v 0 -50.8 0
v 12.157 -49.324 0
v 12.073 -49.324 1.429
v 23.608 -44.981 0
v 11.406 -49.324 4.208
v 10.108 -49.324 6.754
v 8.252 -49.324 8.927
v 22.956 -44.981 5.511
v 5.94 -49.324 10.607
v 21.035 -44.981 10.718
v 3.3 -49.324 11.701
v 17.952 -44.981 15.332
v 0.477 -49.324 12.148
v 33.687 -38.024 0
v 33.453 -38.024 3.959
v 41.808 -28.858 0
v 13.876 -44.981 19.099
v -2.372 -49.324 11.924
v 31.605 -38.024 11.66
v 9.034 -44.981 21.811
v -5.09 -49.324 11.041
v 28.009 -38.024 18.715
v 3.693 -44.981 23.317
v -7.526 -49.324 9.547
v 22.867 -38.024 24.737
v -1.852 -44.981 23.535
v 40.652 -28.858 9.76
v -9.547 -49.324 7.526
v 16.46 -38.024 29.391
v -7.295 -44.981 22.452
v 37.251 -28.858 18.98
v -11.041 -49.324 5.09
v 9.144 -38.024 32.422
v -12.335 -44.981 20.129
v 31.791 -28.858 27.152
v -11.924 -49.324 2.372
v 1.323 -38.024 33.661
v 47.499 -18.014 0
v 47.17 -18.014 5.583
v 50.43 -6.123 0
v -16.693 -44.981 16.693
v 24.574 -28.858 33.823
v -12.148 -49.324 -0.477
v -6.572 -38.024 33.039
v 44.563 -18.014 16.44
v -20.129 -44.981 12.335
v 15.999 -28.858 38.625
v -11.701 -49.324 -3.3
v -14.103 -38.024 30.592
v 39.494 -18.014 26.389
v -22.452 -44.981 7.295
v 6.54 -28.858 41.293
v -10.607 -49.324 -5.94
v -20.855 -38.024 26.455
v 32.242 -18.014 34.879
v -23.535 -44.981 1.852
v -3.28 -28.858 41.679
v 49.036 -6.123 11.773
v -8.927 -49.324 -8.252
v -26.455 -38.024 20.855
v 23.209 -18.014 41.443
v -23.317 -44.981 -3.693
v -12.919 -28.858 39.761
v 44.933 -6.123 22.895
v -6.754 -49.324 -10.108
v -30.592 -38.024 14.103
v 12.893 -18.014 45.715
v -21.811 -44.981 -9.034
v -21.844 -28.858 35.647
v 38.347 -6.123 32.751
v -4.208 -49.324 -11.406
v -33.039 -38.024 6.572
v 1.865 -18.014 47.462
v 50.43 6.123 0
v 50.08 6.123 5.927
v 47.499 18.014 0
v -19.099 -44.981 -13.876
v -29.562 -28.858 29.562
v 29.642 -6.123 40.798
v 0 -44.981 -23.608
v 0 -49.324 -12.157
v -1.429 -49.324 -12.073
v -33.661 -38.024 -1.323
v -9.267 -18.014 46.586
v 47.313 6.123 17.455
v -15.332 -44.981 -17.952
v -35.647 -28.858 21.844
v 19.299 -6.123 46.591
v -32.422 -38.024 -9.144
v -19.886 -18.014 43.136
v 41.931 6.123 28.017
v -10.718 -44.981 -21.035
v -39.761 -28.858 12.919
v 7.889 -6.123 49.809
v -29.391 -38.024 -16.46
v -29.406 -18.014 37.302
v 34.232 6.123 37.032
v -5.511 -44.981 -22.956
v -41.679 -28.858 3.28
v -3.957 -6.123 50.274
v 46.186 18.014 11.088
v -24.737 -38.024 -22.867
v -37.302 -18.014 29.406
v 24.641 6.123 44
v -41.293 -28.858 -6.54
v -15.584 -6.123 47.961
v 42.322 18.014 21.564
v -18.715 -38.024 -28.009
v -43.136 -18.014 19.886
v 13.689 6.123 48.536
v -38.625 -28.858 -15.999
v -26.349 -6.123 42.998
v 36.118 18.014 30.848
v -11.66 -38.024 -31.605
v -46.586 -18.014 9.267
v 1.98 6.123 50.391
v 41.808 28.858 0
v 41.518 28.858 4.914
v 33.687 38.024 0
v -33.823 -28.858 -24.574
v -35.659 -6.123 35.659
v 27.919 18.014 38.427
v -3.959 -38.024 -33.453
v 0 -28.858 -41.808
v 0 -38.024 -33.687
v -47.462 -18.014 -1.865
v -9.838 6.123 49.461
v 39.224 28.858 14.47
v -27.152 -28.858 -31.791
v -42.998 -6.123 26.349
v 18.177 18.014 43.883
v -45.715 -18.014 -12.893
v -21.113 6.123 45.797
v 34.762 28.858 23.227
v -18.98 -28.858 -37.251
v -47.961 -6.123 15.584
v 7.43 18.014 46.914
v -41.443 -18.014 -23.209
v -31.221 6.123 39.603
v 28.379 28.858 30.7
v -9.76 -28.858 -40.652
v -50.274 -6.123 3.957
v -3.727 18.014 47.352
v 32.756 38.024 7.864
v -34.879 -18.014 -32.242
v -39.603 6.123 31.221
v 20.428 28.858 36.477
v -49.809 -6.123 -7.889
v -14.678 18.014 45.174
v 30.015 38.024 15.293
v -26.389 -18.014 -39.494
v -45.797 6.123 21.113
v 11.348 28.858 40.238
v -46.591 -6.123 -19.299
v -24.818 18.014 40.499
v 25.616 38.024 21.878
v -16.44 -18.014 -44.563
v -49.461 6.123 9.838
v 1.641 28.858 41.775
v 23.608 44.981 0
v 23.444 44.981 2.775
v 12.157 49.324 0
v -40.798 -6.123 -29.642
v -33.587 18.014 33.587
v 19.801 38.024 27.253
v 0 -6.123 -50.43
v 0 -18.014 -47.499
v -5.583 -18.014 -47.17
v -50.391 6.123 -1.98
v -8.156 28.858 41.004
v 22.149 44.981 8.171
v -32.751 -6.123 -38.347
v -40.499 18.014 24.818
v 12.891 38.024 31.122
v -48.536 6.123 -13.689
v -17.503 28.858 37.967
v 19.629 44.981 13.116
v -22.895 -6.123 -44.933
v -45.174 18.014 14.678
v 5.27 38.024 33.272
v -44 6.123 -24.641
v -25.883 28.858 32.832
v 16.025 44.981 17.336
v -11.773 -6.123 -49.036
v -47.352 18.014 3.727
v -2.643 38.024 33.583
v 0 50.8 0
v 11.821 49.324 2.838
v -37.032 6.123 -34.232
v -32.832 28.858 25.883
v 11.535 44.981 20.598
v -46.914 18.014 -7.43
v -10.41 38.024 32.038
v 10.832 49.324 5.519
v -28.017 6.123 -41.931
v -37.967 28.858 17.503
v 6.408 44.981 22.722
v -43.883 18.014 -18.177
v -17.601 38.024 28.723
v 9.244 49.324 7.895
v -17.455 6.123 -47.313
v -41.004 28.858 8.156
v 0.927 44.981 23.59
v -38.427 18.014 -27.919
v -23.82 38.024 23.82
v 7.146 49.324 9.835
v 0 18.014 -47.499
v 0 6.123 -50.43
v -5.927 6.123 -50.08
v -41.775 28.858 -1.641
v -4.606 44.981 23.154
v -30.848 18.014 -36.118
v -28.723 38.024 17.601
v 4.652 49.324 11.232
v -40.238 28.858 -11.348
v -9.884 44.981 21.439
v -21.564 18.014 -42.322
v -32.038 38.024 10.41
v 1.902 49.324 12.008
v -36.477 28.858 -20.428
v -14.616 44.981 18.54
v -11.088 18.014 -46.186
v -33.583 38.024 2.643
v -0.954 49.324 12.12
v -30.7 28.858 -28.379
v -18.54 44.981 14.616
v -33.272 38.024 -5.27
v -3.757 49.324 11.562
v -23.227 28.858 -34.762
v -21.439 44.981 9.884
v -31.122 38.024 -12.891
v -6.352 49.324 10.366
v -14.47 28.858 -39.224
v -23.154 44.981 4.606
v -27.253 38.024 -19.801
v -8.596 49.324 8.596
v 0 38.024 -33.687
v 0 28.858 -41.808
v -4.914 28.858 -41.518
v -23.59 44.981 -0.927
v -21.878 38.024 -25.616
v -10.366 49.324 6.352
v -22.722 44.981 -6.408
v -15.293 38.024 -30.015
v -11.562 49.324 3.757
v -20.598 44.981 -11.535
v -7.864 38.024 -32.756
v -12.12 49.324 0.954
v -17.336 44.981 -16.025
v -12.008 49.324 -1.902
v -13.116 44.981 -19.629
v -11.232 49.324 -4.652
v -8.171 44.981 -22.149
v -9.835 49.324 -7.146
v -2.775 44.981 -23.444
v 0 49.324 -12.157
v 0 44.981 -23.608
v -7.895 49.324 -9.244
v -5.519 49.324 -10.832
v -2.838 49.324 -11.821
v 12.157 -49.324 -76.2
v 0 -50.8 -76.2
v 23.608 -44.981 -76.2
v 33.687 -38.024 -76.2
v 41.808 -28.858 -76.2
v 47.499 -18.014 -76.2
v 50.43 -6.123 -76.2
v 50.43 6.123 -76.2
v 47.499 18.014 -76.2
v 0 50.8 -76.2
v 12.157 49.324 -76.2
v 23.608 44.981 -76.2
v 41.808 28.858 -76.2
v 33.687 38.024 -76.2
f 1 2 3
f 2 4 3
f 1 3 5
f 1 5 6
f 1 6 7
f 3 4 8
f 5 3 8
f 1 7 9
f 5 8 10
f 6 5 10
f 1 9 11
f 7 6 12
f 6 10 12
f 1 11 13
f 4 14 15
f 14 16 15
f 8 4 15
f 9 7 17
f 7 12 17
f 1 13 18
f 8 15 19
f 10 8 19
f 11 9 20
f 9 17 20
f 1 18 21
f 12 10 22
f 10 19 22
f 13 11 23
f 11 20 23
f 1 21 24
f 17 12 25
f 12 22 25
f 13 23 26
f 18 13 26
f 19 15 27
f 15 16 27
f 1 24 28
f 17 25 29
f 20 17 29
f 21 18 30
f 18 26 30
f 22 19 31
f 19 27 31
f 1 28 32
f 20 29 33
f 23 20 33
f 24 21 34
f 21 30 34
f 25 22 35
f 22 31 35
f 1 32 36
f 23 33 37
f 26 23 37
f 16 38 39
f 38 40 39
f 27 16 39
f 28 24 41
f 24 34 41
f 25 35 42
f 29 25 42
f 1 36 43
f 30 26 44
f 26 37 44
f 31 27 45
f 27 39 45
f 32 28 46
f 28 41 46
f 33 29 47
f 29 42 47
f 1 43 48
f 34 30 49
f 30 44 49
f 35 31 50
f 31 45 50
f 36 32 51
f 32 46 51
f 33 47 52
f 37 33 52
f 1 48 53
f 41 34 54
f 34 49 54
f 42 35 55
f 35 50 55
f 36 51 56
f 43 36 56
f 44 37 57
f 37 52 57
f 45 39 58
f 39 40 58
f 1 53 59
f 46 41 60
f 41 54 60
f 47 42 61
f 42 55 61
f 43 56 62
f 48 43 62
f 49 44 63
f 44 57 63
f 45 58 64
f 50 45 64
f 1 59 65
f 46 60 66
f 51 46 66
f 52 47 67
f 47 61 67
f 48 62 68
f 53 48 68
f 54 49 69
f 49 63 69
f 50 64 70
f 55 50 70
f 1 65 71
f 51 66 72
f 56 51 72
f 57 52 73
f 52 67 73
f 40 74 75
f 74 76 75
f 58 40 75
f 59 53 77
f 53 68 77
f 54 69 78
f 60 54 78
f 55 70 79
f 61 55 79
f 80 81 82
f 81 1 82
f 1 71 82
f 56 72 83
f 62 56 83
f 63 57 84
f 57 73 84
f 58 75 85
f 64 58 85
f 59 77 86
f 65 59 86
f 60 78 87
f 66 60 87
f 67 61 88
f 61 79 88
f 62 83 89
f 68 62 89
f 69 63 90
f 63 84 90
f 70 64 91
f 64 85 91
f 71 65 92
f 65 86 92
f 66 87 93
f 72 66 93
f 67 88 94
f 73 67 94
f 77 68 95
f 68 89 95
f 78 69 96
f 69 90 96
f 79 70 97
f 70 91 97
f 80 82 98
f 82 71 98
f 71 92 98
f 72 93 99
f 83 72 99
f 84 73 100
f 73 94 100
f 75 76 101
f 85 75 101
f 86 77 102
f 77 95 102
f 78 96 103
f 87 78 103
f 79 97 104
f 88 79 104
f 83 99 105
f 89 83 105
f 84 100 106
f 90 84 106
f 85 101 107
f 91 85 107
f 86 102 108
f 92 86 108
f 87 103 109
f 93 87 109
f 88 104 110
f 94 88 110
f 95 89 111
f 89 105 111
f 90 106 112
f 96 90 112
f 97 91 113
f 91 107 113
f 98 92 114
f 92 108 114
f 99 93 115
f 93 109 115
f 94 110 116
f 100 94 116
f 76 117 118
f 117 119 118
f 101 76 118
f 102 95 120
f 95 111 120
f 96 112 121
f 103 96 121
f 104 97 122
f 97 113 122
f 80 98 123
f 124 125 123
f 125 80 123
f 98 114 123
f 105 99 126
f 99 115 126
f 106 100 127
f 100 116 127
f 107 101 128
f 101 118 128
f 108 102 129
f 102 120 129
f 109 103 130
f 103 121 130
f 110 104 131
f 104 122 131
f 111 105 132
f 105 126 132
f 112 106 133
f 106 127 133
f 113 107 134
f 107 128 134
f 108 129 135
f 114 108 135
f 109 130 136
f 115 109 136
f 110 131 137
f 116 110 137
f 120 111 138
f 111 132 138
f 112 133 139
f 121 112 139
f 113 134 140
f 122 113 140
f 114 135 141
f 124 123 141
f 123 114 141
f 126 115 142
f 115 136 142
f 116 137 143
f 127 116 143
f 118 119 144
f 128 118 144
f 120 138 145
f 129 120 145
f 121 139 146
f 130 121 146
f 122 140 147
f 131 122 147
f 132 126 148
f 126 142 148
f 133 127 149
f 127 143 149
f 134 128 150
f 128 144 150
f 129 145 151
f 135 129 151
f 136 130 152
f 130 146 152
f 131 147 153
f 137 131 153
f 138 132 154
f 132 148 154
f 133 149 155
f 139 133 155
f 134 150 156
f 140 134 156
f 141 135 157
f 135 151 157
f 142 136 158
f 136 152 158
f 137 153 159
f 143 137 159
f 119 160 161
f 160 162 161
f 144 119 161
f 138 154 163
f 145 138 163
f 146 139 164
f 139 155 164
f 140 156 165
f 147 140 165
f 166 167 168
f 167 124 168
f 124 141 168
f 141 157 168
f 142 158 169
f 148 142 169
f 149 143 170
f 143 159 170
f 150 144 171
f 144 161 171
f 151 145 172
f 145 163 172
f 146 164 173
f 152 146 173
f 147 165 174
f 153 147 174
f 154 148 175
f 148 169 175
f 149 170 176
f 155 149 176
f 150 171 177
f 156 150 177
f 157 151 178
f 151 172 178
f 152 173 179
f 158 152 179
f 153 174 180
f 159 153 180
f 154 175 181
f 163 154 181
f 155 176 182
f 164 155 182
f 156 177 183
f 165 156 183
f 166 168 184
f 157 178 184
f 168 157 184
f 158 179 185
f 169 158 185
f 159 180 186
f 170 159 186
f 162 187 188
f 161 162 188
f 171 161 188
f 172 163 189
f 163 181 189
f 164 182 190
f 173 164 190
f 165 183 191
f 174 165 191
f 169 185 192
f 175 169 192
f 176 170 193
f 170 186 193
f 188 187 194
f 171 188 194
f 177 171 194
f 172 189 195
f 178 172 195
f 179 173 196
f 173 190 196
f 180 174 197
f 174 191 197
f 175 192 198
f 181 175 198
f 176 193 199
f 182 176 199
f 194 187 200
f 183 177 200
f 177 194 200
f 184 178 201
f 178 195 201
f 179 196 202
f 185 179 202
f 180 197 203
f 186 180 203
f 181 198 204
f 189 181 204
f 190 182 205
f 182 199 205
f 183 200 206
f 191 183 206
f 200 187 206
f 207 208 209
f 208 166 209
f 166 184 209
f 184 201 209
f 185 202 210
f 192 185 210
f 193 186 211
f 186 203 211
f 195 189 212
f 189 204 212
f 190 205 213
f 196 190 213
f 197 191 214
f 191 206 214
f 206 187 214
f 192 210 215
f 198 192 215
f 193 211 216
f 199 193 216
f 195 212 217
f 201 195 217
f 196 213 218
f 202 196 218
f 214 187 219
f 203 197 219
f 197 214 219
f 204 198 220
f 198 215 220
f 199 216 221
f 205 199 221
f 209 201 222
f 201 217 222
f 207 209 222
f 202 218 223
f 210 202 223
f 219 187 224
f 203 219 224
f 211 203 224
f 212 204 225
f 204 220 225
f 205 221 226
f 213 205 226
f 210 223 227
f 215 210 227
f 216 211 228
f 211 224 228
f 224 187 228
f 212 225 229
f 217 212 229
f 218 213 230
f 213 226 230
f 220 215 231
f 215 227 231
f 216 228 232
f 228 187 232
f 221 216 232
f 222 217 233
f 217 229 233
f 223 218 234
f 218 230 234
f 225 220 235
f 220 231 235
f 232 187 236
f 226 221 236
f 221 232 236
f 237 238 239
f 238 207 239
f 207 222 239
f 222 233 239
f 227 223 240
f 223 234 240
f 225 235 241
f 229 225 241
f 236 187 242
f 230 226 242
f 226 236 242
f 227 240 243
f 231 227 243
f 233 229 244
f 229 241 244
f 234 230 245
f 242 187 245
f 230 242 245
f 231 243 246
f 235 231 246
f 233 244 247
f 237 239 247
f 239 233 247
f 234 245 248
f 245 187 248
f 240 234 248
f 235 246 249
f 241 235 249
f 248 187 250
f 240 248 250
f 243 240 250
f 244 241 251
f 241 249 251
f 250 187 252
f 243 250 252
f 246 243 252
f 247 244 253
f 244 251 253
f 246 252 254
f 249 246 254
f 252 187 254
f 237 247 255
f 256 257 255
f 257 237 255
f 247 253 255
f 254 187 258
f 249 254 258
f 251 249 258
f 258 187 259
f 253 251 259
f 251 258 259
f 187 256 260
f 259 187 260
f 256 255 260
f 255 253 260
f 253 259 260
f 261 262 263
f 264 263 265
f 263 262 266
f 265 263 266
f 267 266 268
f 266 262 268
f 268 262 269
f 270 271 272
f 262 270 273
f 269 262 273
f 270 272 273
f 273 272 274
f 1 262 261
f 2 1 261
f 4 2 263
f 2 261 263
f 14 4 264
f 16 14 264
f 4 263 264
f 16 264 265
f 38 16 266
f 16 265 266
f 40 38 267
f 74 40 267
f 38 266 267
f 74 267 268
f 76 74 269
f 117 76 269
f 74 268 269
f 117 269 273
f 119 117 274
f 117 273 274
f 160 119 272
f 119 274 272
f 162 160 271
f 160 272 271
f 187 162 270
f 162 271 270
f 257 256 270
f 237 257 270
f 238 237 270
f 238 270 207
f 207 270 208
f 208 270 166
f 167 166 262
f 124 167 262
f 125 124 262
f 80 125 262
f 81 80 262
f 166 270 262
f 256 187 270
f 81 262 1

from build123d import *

# Parameters (mm, degrees)
CUT_EXTRUDE3_DEPTH = 762
SWEEP1_START       = -76.2
SWEEP1_DEPTH       = 76.2


# Read off the part's stored shape, not the designer's step: Sweep1
with BuildPart() as part:
    # Sketch2 → Revolve3 (revolve)
    with BuildSketch(Plane.XY):
        with BuildLine():
            Line((0, 50.8), (0, -50.8))
            ThreePointArc((0, -50.8), (50.8, 0), (0, 50.8))
        make_face()
    revolve(axis=Axis((0, 50.8, 0), (0, -1, 0)))

    # Sketch2<4> → Cut-Extrude3 (cut)
    with BuildSketch(Plane.XY):
        with BuildLine():
            Line((0, 50.8), (0, -50.8))
            ThreePointArc((0, -50.8), (50.8, 0), (0, 50.8))
        make_face()
    extrude(amount=-CUT_EXTRUDE3_DEPTH, mode=Mode.SUBTRACT)

    # Sweep1 outline → Sweep1 (add)
    with BuildSketch(Plane.XY.offset(SWEEP1_START)):
        with BuildLine():
            ThreePointArc((0, -50.8), (50.8, 0), (0, 50.8))
            Line((0, 50.8), (0, -50.8))
        make_face()
    extrude(amount=SWEEP1_DEPTH)


solid = part.part
